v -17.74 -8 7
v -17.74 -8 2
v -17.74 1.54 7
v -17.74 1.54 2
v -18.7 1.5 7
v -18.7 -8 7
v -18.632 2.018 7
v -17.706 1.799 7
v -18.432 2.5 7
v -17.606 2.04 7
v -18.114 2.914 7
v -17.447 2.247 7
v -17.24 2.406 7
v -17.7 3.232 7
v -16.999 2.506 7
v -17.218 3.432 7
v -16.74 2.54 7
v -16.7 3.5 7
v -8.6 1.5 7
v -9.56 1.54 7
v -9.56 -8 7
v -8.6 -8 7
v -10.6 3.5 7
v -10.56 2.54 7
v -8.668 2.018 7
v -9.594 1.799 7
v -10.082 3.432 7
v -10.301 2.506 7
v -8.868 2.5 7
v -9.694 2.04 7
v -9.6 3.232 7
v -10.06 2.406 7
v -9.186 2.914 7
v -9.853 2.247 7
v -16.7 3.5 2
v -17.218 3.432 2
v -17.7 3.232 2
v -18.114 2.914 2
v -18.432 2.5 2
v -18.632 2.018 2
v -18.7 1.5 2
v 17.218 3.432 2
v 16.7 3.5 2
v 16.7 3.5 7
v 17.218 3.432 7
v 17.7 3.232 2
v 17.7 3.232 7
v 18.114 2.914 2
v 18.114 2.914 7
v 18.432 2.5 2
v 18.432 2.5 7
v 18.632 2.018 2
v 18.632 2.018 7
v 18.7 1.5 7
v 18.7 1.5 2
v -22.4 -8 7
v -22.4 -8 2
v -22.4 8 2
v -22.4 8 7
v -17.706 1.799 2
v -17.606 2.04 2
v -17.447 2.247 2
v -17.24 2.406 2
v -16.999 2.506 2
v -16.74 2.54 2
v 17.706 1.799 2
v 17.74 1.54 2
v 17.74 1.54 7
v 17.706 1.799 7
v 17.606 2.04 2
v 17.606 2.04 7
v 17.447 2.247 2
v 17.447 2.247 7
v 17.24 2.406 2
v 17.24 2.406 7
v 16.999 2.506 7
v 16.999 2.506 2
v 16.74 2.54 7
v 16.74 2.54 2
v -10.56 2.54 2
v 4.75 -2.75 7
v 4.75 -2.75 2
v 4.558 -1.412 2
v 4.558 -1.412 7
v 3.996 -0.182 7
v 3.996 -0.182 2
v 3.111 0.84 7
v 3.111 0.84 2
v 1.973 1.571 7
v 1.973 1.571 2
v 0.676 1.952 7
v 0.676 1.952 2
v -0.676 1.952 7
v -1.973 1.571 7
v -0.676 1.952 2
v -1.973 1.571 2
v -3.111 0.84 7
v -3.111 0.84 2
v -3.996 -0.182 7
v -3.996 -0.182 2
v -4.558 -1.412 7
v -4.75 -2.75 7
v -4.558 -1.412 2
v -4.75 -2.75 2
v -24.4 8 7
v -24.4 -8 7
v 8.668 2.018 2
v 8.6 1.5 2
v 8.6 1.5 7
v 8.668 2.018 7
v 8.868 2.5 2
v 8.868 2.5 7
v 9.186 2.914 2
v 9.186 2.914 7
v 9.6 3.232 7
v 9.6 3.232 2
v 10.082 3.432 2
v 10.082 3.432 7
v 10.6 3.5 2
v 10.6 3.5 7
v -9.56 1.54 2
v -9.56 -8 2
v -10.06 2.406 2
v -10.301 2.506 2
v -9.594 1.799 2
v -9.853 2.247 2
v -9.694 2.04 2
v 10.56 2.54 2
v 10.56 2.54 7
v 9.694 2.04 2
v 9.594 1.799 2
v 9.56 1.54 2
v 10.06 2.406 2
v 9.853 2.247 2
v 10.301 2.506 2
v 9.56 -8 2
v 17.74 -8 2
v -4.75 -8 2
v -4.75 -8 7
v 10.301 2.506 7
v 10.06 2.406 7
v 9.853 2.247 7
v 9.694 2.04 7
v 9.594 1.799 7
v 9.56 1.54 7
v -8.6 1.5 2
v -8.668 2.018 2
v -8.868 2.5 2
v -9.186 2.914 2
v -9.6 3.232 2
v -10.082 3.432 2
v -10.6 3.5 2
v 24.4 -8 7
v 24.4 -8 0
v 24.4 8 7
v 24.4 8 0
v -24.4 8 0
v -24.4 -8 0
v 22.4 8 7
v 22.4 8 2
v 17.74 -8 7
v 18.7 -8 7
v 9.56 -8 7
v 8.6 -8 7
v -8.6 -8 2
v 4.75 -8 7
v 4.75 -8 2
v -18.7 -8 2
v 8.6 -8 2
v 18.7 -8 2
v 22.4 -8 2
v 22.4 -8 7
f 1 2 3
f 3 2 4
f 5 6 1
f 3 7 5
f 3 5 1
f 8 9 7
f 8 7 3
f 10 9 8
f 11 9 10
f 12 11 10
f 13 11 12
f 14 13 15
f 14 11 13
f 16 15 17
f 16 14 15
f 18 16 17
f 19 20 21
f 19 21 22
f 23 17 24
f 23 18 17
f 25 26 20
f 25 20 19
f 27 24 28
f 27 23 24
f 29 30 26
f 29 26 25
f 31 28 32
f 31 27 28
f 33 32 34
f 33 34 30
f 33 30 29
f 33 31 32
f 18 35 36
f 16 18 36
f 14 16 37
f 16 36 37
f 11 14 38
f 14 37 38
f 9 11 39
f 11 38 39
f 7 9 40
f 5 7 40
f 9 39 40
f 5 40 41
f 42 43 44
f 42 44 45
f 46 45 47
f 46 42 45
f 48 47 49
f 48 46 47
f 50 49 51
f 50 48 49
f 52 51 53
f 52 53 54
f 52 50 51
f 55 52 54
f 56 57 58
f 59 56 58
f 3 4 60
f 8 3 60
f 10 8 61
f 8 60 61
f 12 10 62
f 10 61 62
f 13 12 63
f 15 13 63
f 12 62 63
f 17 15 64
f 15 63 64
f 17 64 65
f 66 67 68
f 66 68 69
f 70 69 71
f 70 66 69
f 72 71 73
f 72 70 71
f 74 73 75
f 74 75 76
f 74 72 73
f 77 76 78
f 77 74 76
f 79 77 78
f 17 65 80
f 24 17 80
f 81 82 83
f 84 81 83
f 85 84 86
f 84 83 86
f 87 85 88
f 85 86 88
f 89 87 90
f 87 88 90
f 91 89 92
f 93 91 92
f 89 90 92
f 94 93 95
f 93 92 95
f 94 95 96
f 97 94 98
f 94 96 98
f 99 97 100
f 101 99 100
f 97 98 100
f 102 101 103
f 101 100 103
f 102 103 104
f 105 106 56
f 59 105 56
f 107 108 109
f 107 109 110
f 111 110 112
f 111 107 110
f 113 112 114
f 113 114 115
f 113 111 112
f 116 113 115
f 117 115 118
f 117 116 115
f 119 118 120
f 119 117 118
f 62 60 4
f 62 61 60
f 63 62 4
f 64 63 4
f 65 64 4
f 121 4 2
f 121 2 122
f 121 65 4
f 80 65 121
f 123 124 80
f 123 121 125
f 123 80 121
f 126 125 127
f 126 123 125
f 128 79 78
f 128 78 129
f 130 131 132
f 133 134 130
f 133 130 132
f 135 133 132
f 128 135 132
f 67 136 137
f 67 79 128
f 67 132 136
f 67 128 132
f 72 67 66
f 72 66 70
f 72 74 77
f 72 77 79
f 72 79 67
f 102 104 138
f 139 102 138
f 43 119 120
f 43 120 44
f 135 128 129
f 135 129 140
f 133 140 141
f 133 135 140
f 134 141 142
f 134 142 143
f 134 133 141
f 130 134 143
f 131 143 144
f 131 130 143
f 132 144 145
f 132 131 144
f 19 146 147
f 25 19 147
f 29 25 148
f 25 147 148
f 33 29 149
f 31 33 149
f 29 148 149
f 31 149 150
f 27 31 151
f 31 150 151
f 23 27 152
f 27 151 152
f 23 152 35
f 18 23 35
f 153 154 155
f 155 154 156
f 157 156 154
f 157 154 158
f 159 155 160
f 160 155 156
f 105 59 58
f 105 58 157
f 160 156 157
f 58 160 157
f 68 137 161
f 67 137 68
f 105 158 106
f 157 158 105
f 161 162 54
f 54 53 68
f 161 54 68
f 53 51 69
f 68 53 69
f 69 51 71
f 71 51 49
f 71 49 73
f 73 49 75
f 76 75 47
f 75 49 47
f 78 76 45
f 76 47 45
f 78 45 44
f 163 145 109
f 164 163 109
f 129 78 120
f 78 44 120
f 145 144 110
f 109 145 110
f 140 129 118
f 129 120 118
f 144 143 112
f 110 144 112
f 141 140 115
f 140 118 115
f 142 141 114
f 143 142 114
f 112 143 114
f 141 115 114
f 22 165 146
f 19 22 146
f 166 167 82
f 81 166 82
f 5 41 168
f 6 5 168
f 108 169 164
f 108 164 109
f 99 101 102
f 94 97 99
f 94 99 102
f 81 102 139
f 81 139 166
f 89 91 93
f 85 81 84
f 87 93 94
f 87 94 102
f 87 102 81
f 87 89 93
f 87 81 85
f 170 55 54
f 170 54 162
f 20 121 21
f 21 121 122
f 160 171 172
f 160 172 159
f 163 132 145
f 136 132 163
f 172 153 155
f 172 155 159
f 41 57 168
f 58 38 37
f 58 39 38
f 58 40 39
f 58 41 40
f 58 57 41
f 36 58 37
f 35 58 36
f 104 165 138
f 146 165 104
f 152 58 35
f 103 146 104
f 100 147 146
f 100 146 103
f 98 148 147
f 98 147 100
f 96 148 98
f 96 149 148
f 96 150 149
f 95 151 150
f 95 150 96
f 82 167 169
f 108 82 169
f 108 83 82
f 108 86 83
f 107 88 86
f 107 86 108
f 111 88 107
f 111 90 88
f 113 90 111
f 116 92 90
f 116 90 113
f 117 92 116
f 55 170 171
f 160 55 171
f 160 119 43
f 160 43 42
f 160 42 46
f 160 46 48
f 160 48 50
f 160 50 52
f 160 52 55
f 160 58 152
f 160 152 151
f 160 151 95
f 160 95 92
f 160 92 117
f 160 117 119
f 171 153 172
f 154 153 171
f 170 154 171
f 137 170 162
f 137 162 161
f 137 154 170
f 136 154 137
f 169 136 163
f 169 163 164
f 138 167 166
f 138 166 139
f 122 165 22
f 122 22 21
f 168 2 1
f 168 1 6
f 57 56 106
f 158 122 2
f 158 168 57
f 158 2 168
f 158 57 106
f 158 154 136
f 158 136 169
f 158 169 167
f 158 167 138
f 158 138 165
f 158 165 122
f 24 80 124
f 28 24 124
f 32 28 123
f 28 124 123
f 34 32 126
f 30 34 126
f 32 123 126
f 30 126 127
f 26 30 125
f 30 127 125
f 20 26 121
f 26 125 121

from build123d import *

# Parameters (mm, degrees)
F0_W     = 44.8
F0_H     = 16
F1_DEPTH = 2
F4_DEPTH = 5
F5_DEPTH = 5
F6_W     = 2
F6_H     = 16
F7_DEPTH = 7


# Not quite as in the source:
# - a pattern or mirror of a feature is missing from the dataset's text; its kind, count and spacing are read off the source's solid


with BuildPart() as f1:
    # F0 (on Top) → F1 (new body)
    with BuildSketch(Plane.XY):
        Rectangle(F0_W, F0_H)
    extrude(amount=F1_DEPTH)

    # F2 (on face) → F4 (join)
    with BuildSketch(Plane.XY.offset(2)):
        with BuildLine():
            Line((-18.7, 1.5), (-18.7, -8))
            Line((-18.7, -8), (-17.74, -8))
            Line((-17.74, -8), (-17.74, 1.54))
            ThreePointArc((-17.74, 1.54), (-17.4471067812, 2.2471067812), (-16.74, 2.54))
            Line((-16.74, 2.54), (-10.56, 2.54))
            ThreePointArc((-10.56, 2.54), (-9.8528932188, 2.2471067812), (-9.56, 1.54))
            Line((-9.56, 1.54), (-9.56, -8))
            Line((-9.56, -8), (-8.6, -8))
            Line((-8.6, -8), (-8.6, 1.5))
            ThreePointArc((-8.6, 1.5), (-9.1857864376, 2.9142135624), (-10.6, 3.5))
            Line((-10.6, 3.5), (-16.7, 3.5))
            ThreePointArc((-16.7, 3.5), (-18.1142135624, 2.9142135624), (-18.7, 1.5))
        make_face()
    f4 = extrude(amount=F4_DEPTH)

    # F4_copies: F4 across plane
    add(f4.mirror(Plane(origin=(0, 0, 0), x_dir=(0, 0, 1), z_dir=(1, 0, 0))))

    # F3 (on face) → F5 (join)
    with BuildSketch(Plane.XY.offset(2)):
        with BuildLine():
            Line((4.75, -8), (4.75, -2.75))
            ThreePointArc((4.75, -2.75), (0, 2), (-4.75, -2.75))
            Line((-4.75, -2.75), (-4.75, -8))
            Line((-4.75, -8), (4.75, -8))
        make_face()
    extrude(amount=F5_DEPTH)

    # F6 (on Top) → F7 (join, through all)
    with BuildSketch(Plane.XY):
        with Locations((-23.4, 0)):
            Rectangle(F6_W, F6_H)
    f7 = extrude(amount=F7_DEPTH)

    # F7_copies: F7 across plane
    add(f7.mirror(Plane(origin=(0, 0, 0), x_dir=(0, 0, 1), z_dir=(1, 0, 0))))


solid = f1.part
